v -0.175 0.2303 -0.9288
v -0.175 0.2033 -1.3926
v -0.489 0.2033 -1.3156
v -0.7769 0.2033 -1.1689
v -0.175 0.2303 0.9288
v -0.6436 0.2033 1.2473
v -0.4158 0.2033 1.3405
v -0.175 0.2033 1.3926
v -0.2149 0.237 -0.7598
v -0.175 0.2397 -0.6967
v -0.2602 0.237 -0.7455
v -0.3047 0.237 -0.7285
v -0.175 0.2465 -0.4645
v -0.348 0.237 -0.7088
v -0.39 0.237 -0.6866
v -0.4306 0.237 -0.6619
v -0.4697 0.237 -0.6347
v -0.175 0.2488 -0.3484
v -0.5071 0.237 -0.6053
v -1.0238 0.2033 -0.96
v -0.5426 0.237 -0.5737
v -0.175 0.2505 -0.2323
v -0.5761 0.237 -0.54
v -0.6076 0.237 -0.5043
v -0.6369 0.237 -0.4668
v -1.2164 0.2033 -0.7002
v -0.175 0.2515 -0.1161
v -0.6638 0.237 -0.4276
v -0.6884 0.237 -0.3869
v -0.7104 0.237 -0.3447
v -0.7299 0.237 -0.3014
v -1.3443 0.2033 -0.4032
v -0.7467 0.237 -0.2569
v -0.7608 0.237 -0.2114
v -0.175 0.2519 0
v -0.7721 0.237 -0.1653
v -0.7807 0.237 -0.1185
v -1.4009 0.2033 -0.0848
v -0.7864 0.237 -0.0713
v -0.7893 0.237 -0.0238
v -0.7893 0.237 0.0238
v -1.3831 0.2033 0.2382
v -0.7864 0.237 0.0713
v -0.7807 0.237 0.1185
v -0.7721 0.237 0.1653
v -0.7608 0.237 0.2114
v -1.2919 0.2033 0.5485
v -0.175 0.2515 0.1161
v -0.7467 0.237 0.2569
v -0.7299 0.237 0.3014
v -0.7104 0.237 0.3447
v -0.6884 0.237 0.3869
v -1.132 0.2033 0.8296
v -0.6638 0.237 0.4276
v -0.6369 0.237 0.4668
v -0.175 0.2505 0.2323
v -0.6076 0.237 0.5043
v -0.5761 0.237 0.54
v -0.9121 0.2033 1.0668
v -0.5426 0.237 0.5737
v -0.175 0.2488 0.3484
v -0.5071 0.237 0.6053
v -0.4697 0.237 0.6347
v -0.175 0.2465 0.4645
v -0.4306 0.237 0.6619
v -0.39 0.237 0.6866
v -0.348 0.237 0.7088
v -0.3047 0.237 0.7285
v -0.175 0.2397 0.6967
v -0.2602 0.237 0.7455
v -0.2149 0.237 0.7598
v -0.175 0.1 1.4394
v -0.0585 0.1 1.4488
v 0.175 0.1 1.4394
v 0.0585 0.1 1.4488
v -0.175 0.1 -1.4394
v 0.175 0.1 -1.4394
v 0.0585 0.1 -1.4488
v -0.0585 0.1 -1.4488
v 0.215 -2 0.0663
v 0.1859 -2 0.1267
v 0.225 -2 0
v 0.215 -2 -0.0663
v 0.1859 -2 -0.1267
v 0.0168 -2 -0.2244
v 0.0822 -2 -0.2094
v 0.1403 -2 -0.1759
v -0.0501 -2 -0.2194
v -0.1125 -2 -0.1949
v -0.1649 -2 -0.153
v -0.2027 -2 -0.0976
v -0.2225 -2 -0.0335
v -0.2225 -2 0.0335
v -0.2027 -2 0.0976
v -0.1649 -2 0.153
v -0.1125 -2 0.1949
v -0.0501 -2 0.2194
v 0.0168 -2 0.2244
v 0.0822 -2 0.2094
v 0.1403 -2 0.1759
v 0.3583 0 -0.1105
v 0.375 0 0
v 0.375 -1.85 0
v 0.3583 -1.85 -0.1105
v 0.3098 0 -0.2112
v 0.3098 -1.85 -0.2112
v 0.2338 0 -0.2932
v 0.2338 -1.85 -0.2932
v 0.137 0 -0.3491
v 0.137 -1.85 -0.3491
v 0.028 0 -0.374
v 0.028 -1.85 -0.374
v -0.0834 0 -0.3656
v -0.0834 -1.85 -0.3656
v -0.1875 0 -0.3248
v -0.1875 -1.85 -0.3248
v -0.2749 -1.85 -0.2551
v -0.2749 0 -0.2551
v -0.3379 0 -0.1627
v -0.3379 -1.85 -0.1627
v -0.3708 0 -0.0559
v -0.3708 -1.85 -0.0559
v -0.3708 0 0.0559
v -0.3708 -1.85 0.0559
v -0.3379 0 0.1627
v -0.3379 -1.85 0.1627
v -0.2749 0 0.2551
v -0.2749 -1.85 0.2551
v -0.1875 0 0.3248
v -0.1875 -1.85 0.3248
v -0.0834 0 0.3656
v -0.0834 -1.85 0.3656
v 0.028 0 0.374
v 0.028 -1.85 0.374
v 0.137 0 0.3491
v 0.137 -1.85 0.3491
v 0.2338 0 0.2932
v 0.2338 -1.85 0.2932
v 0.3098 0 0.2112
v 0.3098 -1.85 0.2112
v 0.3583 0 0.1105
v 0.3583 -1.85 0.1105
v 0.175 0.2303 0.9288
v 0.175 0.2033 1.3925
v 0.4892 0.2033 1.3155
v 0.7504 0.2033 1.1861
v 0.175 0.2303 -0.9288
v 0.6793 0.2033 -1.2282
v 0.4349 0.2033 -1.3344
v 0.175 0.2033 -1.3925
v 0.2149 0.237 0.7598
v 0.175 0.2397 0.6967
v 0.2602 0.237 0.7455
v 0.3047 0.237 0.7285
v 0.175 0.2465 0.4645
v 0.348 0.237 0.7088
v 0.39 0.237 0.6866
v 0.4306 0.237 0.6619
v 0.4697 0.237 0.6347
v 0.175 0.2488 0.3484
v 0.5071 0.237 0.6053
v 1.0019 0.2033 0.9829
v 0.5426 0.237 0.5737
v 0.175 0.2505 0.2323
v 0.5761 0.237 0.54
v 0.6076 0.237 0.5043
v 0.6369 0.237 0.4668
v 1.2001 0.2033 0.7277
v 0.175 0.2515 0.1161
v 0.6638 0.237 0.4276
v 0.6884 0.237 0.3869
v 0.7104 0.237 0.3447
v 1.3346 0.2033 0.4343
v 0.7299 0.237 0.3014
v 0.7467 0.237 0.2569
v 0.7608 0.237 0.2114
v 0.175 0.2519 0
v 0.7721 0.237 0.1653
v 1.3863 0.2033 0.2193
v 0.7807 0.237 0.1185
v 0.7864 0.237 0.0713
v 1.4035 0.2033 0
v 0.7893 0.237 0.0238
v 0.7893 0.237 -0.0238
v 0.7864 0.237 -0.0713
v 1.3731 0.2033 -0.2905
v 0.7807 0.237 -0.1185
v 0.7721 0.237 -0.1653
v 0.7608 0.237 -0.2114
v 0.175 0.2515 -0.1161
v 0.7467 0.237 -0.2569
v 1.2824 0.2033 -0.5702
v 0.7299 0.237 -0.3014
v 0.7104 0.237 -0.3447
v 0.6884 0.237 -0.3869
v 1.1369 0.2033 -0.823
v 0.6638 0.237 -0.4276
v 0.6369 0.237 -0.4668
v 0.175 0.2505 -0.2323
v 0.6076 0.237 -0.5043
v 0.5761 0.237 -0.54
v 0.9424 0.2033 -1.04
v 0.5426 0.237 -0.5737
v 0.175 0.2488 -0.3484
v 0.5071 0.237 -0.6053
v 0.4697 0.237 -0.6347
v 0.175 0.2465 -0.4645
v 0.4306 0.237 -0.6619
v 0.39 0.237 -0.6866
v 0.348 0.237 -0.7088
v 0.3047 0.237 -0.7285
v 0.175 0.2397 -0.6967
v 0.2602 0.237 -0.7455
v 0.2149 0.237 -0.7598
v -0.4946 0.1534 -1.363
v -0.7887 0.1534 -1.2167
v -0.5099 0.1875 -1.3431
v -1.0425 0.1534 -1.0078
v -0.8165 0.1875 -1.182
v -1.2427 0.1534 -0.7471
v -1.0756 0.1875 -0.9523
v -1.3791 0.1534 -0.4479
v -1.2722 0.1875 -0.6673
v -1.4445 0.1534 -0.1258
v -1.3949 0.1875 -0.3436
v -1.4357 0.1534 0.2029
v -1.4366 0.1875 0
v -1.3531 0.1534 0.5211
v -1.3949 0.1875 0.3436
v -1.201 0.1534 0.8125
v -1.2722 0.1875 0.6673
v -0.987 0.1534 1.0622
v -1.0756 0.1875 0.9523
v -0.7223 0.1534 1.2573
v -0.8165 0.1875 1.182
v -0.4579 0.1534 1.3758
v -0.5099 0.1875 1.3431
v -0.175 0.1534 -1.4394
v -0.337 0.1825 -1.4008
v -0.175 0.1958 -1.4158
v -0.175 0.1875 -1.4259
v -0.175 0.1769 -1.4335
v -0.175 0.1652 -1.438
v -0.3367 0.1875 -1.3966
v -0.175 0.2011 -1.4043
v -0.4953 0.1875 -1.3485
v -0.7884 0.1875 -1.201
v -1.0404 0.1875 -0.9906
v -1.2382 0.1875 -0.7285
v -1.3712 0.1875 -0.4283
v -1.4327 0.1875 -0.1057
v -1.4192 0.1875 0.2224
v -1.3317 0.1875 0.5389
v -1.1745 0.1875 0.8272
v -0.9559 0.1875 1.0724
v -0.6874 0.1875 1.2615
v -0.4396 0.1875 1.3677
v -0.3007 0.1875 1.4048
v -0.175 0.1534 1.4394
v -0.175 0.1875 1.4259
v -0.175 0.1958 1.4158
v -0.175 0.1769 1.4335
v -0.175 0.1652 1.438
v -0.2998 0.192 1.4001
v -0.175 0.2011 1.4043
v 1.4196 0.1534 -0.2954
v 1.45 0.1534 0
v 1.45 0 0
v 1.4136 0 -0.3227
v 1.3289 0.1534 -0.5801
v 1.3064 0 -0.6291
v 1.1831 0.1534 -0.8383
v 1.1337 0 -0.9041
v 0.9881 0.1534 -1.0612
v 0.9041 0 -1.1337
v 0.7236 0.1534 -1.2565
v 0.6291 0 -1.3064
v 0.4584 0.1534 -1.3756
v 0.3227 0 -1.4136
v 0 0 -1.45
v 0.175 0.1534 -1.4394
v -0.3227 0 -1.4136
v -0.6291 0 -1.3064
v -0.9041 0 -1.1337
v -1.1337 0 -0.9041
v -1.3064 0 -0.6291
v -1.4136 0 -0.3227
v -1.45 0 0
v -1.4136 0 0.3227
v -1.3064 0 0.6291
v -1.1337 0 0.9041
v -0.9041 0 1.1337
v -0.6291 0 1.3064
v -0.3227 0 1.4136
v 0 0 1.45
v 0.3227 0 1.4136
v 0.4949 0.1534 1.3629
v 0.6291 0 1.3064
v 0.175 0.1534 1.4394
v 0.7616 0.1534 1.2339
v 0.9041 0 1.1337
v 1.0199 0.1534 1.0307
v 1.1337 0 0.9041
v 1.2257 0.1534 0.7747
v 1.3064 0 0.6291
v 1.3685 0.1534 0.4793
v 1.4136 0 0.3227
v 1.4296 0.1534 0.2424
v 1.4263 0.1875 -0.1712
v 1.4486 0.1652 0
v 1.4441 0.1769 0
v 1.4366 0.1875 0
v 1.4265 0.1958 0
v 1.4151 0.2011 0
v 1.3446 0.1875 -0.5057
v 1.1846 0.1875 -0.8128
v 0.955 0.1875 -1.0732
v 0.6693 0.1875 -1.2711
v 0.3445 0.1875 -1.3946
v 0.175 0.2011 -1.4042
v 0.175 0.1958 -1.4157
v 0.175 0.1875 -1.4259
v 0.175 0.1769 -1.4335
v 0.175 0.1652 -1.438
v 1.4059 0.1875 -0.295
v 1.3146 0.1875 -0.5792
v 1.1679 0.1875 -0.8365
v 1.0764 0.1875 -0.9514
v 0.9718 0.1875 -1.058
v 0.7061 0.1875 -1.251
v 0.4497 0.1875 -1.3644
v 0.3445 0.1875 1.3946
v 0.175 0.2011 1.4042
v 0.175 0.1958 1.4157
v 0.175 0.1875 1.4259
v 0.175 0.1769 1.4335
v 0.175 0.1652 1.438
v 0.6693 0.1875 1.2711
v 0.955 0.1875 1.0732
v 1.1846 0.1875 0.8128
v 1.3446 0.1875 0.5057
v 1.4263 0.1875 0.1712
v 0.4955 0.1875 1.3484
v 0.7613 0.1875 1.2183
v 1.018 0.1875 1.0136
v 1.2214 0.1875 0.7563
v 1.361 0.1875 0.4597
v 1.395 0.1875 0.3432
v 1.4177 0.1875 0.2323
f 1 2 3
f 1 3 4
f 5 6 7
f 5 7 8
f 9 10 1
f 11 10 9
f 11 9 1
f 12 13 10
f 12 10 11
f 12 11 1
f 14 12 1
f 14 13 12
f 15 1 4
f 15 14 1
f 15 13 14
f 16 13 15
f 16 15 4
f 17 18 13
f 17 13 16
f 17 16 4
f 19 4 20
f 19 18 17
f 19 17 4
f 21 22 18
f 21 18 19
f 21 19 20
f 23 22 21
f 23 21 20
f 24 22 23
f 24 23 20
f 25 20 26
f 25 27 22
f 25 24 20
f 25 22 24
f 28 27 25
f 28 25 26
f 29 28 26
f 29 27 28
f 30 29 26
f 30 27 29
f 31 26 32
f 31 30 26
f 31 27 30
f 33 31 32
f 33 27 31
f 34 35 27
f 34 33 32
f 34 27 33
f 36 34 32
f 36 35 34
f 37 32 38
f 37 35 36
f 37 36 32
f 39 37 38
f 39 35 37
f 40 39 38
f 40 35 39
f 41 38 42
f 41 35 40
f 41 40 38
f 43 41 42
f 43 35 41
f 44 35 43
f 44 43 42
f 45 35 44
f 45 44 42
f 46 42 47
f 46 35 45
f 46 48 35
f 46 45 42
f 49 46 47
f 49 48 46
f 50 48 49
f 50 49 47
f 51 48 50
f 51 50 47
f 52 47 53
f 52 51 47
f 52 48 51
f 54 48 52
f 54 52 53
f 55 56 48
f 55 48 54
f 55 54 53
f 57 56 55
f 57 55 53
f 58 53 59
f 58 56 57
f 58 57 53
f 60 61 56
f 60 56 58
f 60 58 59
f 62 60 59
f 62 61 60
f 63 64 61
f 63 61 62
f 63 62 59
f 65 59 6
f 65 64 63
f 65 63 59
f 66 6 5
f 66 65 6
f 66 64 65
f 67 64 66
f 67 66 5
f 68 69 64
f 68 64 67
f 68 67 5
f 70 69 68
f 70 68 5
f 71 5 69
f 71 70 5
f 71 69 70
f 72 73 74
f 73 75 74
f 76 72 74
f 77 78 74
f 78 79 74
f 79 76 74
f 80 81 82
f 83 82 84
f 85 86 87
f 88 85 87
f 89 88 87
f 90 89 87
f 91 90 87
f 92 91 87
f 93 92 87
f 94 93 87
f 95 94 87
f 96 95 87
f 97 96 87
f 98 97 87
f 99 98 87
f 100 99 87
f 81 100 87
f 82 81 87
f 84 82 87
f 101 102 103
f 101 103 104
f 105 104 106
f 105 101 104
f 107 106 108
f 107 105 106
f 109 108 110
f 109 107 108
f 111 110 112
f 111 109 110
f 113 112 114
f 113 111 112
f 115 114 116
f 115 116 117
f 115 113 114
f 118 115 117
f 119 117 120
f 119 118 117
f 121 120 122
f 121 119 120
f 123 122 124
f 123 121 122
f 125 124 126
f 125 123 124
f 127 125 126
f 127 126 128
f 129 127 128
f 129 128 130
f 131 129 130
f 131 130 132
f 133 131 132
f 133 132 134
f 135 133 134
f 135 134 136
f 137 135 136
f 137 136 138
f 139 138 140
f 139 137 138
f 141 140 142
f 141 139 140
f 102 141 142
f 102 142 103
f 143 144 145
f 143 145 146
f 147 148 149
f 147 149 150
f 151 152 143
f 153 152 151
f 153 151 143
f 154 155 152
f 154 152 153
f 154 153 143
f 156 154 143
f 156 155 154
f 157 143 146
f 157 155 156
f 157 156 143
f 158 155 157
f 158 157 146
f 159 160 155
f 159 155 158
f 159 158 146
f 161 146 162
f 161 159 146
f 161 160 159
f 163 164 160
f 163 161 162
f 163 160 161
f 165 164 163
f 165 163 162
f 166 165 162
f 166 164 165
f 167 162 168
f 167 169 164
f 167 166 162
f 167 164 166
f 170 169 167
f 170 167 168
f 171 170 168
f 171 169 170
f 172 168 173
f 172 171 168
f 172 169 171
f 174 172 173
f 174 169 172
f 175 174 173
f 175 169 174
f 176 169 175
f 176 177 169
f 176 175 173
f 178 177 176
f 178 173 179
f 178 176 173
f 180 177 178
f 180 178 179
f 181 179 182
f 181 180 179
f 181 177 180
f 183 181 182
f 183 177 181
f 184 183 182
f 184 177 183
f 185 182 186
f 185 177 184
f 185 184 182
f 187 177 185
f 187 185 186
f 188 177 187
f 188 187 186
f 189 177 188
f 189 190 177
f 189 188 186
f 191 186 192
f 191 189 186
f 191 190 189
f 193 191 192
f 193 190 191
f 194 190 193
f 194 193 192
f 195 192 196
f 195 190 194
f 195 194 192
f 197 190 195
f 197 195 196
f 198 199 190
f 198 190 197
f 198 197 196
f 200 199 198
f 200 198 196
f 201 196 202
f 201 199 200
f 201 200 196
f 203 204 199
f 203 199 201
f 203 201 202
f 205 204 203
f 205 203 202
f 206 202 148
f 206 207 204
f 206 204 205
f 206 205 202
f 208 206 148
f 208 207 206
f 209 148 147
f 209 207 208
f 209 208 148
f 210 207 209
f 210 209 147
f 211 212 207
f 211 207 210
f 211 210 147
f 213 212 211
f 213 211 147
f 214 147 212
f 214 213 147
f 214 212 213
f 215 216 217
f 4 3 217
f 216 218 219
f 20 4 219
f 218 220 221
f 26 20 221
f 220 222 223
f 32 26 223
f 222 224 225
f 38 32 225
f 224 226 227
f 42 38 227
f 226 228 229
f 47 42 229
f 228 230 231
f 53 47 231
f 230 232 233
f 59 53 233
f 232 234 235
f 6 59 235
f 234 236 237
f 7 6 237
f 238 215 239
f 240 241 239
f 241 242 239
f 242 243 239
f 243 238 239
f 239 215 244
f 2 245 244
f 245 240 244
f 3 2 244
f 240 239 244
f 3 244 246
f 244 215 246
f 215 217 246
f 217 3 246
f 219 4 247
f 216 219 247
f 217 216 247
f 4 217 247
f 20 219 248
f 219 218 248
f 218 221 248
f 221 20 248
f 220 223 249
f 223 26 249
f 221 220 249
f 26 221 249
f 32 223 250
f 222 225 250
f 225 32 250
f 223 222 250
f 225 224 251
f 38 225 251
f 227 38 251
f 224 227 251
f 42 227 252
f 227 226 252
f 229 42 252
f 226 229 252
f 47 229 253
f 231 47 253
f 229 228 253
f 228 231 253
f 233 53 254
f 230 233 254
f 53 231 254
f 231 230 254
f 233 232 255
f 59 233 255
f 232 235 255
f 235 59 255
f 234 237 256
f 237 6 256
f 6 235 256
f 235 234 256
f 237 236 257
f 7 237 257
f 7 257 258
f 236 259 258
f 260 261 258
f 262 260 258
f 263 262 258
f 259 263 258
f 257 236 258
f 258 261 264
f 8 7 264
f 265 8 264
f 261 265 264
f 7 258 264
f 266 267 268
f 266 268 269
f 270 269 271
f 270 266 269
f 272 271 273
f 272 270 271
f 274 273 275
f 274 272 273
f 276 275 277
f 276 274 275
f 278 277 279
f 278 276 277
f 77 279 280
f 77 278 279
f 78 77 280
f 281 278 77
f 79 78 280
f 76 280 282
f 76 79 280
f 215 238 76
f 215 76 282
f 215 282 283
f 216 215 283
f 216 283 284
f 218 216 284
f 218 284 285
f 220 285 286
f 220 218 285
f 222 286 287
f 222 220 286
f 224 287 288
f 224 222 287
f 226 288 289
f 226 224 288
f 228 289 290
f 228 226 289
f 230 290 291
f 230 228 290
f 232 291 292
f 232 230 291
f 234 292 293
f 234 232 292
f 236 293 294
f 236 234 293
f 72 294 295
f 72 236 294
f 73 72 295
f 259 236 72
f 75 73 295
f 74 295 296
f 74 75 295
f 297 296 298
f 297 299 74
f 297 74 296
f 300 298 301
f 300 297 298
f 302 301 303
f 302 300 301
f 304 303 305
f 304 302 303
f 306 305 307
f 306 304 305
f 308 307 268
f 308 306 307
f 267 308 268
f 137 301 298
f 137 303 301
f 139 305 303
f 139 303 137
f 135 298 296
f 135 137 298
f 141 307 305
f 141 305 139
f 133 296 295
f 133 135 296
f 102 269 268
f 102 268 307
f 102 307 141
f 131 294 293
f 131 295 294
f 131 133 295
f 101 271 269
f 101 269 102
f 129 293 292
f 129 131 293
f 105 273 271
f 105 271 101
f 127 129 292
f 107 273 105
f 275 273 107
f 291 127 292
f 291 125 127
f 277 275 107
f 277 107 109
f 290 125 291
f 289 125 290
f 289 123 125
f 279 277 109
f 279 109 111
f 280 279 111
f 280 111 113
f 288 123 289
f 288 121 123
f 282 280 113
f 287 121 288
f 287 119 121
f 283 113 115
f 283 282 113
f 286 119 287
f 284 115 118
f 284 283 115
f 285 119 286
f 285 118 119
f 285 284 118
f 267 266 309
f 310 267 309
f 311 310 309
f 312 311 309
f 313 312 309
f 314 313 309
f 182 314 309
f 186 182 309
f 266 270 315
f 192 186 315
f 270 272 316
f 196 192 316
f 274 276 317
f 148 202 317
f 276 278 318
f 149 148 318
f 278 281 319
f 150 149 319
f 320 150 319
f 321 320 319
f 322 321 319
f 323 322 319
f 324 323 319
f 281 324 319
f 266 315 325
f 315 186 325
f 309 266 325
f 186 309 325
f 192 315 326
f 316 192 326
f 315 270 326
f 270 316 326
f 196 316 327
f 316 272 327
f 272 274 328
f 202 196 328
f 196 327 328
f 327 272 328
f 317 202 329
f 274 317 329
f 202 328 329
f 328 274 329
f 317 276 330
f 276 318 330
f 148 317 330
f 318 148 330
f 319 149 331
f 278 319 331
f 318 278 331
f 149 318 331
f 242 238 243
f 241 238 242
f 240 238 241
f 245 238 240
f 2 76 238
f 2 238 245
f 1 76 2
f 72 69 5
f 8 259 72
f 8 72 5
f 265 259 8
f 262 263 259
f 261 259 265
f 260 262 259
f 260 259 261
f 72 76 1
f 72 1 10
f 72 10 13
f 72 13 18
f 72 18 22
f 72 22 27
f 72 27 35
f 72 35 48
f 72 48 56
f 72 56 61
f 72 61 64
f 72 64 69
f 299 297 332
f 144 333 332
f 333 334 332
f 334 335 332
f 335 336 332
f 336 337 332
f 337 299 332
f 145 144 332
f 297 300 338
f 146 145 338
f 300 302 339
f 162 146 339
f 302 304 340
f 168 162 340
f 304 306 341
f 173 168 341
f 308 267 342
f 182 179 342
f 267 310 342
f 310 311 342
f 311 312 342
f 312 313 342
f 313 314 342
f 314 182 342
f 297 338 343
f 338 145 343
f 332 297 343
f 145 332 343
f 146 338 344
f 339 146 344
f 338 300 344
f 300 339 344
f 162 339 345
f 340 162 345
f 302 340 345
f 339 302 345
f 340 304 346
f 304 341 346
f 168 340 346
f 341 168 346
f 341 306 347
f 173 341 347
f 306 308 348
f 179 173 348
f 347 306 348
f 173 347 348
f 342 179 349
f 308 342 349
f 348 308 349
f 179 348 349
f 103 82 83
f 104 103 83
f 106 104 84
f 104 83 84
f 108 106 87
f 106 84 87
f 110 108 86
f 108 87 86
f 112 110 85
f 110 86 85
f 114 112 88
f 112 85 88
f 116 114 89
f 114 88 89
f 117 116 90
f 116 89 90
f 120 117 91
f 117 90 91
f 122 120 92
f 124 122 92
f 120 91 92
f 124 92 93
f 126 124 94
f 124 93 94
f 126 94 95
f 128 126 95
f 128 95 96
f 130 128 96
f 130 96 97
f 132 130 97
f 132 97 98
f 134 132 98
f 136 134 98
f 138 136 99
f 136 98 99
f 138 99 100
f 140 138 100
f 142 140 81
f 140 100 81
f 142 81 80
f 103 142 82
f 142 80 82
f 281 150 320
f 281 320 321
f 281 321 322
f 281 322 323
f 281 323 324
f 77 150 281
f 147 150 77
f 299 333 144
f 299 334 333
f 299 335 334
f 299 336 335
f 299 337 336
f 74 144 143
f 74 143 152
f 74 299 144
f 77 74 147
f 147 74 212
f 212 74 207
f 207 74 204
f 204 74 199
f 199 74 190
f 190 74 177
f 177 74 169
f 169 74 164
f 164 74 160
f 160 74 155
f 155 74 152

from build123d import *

# Parameters (mm, degrees)
SKETCH2_R               = 0.375
BOSS_EXTRUDE2_DEPTH     = 2
FILLET1_R               = 0.05
CHAMFER2_SIZE           = 0.15
CUT_EXTRUDE1_DEPTH      = 2.4500001
CUT_EXTRUDE1_DEPTH_BACK = 2.4500001


with BuildPart() as part:
    # Sketch4 → Revolve1 (revolve)
    with BuildSketch(Plane.XY):
        with BuildLine():
            Line((0, 0), (1.45, 0))
            Line((1.45, 0), (1.45, 0.2))
            ThreePointArc((1.45, 0.2), (0.725477446, 0.239469483), (0, 0.252631753))
            Line((0, 0.252631753), (0, 0))
        make_face()
    revolve(axis=Axis((0, -848.356227188, 0), (0, 1, 0)))

    # Sketch2 → Boss-Extrude2 (add)
    with BuildSketch(Plane(origin=(0, 0, 0), x_dir=(1, 0, 0), z_dir=(0, 1, 0))):
        Circle(SKETCH2_R)
    extrude(amount=-BOSS_EXTRUDE2_DEPTH)

    # Fillet1
    fillet1_edges = [part.edges().sort_by_distance(p)[0] for p in [
        (-1.45, 0.2, 0),
    ]]
    fillet(fillet1_edges, radius=FILLET1_R)

    # Chamfer2
    chamfer2_edges = [part.edges().sort_by_distance(p)[0] for p in [
        (-0.375, -2, 0),
    ]]
    chamfer(chamfer2_edges, length=CHAMFER2_SIZE)

    # Sketch3 → Cut-Extrude1 (cut, two sides)
    with BuildSketch(Plane.XY) as cut_extrude1_sk:
        Polygon((-0.175, 0.35), (0, 0.35), (0.175, 0.35), (0.175, 0.1), (0, 0.1), (-0.175, 0.1), align=None)
    extrude(amount=CUT_EXTRUDE1_DEPTH, mode=Mode.SUBTRACT)
    extrude(cut_extrude1_sk.sketch, amount=-CUT_EXTRUDE1_DEPTH_BACK, mode=Mode.SUBTRACT)


solid = part.part
